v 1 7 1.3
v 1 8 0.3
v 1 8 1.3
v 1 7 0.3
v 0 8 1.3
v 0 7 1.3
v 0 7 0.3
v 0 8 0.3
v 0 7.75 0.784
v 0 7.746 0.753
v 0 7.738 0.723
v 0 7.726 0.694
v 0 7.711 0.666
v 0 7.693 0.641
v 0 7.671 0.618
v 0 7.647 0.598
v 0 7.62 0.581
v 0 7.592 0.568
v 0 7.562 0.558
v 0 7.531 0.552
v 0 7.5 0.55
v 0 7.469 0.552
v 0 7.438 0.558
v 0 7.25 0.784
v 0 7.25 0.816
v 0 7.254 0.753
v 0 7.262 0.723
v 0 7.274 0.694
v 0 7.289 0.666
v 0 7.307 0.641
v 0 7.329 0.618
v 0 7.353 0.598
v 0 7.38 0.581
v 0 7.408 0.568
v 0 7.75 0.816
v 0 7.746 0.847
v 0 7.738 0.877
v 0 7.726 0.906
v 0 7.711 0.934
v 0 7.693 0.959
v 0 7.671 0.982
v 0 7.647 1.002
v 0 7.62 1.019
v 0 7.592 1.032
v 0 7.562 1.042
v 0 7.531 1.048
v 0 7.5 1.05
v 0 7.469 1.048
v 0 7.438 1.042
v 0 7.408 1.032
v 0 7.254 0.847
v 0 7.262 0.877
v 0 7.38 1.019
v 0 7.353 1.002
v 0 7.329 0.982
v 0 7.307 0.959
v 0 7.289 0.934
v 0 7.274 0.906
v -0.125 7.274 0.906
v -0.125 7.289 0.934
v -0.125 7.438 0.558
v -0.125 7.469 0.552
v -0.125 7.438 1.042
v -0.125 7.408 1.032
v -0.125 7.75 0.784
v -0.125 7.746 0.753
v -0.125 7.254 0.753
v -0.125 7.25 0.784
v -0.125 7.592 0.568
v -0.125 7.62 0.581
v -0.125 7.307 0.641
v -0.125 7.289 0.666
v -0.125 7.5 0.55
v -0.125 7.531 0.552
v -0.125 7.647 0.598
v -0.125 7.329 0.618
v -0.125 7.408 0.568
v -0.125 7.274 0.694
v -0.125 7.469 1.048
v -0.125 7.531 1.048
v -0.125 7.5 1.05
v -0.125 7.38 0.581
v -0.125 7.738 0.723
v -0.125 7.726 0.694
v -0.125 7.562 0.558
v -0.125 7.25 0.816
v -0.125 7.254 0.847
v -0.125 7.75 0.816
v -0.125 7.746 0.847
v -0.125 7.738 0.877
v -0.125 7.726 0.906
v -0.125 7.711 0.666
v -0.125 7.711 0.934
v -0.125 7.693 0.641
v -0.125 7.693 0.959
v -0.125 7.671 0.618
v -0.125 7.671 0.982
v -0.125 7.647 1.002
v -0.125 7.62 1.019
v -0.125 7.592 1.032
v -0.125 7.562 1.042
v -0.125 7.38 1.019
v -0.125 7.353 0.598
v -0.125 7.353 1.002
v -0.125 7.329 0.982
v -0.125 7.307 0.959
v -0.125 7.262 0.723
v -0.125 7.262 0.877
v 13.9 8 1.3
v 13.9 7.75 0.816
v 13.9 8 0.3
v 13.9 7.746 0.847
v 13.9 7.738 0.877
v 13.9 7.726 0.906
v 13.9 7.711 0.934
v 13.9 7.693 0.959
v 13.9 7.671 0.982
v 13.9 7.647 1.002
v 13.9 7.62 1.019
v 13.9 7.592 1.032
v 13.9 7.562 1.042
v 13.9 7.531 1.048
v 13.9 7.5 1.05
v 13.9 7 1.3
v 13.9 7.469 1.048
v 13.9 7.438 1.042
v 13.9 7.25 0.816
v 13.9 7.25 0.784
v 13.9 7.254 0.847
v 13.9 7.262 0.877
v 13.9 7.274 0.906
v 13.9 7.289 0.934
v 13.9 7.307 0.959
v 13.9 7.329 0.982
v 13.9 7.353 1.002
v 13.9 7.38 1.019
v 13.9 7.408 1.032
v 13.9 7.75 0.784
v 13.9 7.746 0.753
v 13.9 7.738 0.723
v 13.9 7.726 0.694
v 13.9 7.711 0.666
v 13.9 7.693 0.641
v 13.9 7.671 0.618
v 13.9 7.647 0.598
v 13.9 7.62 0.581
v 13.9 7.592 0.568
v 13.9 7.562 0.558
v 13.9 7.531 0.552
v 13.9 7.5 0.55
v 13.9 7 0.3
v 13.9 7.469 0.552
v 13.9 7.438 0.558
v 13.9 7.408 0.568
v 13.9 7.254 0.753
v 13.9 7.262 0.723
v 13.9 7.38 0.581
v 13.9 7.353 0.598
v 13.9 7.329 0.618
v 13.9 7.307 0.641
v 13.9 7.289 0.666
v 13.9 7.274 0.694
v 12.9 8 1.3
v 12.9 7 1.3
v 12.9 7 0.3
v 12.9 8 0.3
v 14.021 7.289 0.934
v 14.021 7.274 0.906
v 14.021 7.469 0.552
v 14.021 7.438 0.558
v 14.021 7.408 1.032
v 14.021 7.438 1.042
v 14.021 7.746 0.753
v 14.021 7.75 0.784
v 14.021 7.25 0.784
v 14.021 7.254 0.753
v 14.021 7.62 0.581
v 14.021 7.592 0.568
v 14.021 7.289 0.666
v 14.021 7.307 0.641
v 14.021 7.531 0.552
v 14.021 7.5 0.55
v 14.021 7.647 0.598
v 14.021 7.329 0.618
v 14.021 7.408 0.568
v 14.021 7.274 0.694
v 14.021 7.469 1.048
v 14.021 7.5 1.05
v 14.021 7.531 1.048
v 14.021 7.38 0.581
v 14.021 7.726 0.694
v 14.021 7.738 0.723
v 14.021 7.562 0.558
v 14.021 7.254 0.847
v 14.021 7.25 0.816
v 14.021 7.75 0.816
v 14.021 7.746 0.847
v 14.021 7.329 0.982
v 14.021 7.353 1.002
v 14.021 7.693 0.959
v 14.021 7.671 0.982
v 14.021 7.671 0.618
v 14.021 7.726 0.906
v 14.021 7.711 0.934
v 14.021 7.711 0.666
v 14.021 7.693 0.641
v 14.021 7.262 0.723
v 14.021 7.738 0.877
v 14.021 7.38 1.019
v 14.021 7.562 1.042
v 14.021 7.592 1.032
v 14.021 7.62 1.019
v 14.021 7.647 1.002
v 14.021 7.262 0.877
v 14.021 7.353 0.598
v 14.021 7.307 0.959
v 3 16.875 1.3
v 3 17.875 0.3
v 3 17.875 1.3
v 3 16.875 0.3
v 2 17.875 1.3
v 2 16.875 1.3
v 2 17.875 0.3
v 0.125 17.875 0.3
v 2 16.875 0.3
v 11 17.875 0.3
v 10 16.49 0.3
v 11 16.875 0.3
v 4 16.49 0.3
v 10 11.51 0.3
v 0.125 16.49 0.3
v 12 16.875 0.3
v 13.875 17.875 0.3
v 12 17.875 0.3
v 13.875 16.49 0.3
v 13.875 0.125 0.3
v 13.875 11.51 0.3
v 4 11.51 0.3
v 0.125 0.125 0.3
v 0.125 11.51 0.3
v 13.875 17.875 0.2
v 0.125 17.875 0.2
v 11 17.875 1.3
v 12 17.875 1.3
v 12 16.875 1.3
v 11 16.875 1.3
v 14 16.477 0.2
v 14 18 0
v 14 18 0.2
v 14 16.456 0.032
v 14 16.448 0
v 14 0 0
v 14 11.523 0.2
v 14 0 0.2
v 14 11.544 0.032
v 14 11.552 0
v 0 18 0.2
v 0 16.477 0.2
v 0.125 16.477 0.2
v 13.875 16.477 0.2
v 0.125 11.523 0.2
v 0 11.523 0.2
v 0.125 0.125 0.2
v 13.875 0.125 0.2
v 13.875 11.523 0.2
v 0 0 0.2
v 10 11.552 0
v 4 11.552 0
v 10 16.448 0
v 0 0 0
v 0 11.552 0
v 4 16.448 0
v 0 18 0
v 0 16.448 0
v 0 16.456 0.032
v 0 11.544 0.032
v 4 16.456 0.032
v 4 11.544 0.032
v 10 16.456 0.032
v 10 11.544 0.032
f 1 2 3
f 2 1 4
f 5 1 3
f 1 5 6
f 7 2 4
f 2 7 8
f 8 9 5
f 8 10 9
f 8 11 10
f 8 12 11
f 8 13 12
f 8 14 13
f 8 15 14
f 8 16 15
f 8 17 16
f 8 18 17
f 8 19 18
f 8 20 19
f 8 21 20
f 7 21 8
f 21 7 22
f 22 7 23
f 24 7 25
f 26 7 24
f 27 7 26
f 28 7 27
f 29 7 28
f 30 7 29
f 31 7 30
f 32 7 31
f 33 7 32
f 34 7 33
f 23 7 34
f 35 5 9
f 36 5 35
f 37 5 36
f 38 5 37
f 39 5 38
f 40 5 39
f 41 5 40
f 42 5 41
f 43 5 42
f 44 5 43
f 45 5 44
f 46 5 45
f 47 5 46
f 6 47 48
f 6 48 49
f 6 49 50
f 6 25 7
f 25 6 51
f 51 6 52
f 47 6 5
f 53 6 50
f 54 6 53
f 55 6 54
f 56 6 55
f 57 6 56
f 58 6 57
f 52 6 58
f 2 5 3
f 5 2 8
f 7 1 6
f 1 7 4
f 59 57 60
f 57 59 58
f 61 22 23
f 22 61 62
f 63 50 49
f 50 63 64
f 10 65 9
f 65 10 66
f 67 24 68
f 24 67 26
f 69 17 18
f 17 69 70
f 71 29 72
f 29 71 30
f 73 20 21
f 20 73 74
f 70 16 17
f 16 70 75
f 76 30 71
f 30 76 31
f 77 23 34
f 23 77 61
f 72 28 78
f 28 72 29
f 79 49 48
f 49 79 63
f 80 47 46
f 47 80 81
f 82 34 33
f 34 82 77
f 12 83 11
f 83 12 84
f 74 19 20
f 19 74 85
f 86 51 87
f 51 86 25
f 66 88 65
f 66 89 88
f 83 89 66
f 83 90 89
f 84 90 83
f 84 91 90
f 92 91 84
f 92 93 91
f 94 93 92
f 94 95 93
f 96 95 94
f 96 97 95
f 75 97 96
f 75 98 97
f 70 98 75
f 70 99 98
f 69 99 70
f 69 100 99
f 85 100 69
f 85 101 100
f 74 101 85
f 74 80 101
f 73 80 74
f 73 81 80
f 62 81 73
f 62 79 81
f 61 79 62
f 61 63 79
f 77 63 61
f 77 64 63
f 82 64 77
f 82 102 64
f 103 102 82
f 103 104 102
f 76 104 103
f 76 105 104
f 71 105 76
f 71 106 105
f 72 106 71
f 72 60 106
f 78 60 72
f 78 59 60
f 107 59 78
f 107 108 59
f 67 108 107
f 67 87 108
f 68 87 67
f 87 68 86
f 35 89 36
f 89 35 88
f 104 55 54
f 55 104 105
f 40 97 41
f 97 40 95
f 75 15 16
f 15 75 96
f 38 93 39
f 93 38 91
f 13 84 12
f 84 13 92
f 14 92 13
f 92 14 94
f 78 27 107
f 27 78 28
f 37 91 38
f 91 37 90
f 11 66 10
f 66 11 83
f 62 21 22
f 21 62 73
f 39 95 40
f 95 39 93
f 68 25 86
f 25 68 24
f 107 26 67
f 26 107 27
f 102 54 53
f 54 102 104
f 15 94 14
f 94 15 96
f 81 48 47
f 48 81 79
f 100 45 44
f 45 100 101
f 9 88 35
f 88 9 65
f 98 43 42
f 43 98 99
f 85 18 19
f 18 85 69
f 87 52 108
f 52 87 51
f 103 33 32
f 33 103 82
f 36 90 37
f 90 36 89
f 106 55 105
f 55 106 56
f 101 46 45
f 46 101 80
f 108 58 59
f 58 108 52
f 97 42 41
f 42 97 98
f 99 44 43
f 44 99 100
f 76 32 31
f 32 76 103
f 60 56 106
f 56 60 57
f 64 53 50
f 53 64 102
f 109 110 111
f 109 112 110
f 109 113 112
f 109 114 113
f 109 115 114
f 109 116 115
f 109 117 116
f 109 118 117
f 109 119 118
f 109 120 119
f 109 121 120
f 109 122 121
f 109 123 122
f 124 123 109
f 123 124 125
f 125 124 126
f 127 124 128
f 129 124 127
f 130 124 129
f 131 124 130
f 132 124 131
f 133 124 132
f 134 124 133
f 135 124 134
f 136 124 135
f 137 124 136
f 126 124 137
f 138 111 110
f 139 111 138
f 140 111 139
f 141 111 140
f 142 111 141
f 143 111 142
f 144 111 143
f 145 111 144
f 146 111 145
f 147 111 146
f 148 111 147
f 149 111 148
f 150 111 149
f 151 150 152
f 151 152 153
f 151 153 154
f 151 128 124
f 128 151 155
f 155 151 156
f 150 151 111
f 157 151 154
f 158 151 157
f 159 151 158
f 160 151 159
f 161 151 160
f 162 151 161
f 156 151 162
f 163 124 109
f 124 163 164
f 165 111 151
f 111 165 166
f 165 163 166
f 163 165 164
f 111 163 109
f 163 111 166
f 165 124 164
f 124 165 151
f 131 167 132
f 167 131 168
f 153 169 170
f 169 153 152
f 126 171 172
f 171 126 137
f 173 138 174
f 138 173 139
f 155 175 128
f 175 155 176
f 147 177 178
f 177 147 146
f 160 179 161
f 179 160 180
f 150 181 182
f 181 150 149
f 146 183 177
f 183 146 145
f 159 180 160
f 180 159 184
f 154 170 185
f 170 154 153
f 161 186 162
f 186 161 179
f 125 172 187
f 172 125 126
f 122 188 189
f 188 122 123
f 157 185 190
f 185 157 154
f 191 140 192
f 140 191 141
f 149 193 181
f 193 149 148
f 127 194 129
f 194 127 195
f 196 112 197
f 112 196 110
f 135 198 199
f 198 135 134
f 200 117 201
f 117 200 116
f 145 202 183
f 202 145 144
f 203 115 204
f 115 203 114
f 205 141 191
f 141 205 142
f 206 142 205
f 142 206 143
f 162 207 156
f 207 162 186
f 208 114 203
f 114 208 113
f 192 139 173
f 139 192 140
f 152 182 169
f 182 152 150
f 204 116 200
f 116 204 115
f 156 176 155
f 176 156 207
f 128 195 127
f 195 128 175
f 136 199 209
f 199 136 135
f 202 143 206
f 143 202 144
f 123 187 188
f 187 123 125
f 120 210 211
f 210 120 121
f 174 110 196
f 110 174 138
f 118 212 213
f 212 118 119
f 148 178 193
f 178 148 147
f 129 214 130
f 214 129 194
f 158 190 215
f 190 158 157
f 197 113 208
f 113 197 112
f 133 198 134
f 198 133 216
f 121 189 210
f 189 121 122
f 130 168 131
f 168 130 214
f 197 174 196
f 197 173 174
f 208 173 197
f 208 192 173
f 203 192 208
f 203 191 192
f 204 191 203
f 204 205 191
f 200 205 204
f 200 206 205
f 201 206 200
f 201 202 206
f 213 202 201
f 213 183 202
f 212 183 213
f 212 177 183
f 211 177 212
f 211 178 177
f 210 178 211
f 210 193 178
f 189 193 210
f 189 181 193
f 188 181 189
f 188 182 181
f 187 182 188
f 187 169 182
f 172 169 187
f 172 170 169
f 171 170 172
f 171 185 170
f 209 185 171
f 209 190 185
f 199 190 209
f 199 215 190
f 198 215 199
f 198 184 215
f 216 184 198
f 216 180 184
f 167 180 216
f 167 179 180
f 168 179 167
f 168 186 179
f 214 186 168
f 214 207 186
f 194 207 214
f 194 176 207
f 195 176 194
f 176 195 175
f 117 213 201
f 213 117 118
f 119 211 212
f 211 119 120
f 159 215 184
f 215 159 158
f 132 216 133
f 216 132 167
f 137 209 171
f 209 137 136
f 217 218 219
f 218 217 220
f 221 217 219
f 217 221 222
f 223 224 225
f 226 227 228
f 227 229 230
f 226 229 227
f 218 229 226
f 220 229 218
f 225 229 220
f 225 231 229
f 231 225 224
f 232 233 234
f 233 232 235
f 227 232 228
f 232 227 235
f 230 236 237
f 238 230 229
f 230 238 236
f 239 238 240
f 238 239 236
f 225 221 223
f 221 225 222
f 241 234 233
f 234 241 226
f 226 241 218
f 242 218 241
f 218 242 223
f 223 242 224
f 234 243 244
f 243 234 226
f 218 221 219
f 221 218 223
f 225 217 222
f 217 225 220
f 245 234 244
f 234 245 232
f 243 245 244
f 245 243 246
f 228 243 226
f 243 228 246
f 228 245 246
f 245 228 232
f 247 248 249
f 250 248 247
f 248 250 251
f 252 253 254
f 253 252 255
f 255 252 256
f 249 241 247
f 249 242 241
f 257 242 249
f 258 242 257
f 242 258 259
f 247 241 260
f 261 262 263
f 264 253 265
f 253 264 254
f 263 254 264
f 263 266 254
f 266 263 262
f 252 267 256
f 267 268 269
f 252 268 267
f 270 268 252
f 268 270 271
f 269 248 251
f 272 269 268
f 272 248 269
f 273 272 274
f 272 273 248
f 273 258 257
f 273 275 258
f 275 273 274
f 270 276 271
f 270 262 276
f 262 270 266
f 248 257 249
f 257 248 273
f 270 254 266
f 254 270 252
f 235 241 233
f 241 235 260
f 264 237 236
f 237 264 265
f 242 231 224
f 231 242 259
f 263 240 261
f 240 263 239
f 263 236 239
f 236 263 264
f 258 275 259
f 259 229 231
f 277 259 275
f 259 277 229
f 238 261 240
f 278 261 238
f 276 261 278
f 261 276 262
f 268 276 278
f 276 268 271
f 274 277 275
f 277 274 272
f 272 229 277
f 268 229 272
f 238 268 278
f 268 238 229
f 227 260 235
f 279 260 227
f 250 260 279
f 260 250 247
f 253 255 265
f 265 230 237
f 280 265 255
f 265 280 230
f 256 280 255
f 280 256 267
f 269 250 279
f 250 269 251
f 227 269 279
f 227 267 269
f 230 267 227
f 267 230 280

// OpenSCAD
$fn = 50;
w = 14;
d= 18;
h=0.2;
r=2.5;

wall = 0.25;

module GroundPlate(){
    cube([w, d, h]);
    translate([wall/2, wall/2, 0.1]){
        cube([w-wall, d-wall, h]);
    }
    for(i =[0, w-1.1]){
        difference(){
        translate([i, 7, 0.3]){
            cube(1);
                translate([0.25+i/(w-1)*0.5, 0.5, 0.5]){
                    rotate([0,90, 0]){
                       cylinder(0.75, 0.25, 0.25, center = true);
                    }
              }
        }
     }
    }
    for(i = [2, w-3]){
        translate([i, d-1-wall/2, 0.3]){
            cube(1);
        }
    }
}
difference(){
    GroundPlate();
    for(i=[0, w-4]){
      translate([i,14, 0.5]){
          rotate([0,90,0]){
            #cylinder(4, r, r);  
          }
      }
  }
}
